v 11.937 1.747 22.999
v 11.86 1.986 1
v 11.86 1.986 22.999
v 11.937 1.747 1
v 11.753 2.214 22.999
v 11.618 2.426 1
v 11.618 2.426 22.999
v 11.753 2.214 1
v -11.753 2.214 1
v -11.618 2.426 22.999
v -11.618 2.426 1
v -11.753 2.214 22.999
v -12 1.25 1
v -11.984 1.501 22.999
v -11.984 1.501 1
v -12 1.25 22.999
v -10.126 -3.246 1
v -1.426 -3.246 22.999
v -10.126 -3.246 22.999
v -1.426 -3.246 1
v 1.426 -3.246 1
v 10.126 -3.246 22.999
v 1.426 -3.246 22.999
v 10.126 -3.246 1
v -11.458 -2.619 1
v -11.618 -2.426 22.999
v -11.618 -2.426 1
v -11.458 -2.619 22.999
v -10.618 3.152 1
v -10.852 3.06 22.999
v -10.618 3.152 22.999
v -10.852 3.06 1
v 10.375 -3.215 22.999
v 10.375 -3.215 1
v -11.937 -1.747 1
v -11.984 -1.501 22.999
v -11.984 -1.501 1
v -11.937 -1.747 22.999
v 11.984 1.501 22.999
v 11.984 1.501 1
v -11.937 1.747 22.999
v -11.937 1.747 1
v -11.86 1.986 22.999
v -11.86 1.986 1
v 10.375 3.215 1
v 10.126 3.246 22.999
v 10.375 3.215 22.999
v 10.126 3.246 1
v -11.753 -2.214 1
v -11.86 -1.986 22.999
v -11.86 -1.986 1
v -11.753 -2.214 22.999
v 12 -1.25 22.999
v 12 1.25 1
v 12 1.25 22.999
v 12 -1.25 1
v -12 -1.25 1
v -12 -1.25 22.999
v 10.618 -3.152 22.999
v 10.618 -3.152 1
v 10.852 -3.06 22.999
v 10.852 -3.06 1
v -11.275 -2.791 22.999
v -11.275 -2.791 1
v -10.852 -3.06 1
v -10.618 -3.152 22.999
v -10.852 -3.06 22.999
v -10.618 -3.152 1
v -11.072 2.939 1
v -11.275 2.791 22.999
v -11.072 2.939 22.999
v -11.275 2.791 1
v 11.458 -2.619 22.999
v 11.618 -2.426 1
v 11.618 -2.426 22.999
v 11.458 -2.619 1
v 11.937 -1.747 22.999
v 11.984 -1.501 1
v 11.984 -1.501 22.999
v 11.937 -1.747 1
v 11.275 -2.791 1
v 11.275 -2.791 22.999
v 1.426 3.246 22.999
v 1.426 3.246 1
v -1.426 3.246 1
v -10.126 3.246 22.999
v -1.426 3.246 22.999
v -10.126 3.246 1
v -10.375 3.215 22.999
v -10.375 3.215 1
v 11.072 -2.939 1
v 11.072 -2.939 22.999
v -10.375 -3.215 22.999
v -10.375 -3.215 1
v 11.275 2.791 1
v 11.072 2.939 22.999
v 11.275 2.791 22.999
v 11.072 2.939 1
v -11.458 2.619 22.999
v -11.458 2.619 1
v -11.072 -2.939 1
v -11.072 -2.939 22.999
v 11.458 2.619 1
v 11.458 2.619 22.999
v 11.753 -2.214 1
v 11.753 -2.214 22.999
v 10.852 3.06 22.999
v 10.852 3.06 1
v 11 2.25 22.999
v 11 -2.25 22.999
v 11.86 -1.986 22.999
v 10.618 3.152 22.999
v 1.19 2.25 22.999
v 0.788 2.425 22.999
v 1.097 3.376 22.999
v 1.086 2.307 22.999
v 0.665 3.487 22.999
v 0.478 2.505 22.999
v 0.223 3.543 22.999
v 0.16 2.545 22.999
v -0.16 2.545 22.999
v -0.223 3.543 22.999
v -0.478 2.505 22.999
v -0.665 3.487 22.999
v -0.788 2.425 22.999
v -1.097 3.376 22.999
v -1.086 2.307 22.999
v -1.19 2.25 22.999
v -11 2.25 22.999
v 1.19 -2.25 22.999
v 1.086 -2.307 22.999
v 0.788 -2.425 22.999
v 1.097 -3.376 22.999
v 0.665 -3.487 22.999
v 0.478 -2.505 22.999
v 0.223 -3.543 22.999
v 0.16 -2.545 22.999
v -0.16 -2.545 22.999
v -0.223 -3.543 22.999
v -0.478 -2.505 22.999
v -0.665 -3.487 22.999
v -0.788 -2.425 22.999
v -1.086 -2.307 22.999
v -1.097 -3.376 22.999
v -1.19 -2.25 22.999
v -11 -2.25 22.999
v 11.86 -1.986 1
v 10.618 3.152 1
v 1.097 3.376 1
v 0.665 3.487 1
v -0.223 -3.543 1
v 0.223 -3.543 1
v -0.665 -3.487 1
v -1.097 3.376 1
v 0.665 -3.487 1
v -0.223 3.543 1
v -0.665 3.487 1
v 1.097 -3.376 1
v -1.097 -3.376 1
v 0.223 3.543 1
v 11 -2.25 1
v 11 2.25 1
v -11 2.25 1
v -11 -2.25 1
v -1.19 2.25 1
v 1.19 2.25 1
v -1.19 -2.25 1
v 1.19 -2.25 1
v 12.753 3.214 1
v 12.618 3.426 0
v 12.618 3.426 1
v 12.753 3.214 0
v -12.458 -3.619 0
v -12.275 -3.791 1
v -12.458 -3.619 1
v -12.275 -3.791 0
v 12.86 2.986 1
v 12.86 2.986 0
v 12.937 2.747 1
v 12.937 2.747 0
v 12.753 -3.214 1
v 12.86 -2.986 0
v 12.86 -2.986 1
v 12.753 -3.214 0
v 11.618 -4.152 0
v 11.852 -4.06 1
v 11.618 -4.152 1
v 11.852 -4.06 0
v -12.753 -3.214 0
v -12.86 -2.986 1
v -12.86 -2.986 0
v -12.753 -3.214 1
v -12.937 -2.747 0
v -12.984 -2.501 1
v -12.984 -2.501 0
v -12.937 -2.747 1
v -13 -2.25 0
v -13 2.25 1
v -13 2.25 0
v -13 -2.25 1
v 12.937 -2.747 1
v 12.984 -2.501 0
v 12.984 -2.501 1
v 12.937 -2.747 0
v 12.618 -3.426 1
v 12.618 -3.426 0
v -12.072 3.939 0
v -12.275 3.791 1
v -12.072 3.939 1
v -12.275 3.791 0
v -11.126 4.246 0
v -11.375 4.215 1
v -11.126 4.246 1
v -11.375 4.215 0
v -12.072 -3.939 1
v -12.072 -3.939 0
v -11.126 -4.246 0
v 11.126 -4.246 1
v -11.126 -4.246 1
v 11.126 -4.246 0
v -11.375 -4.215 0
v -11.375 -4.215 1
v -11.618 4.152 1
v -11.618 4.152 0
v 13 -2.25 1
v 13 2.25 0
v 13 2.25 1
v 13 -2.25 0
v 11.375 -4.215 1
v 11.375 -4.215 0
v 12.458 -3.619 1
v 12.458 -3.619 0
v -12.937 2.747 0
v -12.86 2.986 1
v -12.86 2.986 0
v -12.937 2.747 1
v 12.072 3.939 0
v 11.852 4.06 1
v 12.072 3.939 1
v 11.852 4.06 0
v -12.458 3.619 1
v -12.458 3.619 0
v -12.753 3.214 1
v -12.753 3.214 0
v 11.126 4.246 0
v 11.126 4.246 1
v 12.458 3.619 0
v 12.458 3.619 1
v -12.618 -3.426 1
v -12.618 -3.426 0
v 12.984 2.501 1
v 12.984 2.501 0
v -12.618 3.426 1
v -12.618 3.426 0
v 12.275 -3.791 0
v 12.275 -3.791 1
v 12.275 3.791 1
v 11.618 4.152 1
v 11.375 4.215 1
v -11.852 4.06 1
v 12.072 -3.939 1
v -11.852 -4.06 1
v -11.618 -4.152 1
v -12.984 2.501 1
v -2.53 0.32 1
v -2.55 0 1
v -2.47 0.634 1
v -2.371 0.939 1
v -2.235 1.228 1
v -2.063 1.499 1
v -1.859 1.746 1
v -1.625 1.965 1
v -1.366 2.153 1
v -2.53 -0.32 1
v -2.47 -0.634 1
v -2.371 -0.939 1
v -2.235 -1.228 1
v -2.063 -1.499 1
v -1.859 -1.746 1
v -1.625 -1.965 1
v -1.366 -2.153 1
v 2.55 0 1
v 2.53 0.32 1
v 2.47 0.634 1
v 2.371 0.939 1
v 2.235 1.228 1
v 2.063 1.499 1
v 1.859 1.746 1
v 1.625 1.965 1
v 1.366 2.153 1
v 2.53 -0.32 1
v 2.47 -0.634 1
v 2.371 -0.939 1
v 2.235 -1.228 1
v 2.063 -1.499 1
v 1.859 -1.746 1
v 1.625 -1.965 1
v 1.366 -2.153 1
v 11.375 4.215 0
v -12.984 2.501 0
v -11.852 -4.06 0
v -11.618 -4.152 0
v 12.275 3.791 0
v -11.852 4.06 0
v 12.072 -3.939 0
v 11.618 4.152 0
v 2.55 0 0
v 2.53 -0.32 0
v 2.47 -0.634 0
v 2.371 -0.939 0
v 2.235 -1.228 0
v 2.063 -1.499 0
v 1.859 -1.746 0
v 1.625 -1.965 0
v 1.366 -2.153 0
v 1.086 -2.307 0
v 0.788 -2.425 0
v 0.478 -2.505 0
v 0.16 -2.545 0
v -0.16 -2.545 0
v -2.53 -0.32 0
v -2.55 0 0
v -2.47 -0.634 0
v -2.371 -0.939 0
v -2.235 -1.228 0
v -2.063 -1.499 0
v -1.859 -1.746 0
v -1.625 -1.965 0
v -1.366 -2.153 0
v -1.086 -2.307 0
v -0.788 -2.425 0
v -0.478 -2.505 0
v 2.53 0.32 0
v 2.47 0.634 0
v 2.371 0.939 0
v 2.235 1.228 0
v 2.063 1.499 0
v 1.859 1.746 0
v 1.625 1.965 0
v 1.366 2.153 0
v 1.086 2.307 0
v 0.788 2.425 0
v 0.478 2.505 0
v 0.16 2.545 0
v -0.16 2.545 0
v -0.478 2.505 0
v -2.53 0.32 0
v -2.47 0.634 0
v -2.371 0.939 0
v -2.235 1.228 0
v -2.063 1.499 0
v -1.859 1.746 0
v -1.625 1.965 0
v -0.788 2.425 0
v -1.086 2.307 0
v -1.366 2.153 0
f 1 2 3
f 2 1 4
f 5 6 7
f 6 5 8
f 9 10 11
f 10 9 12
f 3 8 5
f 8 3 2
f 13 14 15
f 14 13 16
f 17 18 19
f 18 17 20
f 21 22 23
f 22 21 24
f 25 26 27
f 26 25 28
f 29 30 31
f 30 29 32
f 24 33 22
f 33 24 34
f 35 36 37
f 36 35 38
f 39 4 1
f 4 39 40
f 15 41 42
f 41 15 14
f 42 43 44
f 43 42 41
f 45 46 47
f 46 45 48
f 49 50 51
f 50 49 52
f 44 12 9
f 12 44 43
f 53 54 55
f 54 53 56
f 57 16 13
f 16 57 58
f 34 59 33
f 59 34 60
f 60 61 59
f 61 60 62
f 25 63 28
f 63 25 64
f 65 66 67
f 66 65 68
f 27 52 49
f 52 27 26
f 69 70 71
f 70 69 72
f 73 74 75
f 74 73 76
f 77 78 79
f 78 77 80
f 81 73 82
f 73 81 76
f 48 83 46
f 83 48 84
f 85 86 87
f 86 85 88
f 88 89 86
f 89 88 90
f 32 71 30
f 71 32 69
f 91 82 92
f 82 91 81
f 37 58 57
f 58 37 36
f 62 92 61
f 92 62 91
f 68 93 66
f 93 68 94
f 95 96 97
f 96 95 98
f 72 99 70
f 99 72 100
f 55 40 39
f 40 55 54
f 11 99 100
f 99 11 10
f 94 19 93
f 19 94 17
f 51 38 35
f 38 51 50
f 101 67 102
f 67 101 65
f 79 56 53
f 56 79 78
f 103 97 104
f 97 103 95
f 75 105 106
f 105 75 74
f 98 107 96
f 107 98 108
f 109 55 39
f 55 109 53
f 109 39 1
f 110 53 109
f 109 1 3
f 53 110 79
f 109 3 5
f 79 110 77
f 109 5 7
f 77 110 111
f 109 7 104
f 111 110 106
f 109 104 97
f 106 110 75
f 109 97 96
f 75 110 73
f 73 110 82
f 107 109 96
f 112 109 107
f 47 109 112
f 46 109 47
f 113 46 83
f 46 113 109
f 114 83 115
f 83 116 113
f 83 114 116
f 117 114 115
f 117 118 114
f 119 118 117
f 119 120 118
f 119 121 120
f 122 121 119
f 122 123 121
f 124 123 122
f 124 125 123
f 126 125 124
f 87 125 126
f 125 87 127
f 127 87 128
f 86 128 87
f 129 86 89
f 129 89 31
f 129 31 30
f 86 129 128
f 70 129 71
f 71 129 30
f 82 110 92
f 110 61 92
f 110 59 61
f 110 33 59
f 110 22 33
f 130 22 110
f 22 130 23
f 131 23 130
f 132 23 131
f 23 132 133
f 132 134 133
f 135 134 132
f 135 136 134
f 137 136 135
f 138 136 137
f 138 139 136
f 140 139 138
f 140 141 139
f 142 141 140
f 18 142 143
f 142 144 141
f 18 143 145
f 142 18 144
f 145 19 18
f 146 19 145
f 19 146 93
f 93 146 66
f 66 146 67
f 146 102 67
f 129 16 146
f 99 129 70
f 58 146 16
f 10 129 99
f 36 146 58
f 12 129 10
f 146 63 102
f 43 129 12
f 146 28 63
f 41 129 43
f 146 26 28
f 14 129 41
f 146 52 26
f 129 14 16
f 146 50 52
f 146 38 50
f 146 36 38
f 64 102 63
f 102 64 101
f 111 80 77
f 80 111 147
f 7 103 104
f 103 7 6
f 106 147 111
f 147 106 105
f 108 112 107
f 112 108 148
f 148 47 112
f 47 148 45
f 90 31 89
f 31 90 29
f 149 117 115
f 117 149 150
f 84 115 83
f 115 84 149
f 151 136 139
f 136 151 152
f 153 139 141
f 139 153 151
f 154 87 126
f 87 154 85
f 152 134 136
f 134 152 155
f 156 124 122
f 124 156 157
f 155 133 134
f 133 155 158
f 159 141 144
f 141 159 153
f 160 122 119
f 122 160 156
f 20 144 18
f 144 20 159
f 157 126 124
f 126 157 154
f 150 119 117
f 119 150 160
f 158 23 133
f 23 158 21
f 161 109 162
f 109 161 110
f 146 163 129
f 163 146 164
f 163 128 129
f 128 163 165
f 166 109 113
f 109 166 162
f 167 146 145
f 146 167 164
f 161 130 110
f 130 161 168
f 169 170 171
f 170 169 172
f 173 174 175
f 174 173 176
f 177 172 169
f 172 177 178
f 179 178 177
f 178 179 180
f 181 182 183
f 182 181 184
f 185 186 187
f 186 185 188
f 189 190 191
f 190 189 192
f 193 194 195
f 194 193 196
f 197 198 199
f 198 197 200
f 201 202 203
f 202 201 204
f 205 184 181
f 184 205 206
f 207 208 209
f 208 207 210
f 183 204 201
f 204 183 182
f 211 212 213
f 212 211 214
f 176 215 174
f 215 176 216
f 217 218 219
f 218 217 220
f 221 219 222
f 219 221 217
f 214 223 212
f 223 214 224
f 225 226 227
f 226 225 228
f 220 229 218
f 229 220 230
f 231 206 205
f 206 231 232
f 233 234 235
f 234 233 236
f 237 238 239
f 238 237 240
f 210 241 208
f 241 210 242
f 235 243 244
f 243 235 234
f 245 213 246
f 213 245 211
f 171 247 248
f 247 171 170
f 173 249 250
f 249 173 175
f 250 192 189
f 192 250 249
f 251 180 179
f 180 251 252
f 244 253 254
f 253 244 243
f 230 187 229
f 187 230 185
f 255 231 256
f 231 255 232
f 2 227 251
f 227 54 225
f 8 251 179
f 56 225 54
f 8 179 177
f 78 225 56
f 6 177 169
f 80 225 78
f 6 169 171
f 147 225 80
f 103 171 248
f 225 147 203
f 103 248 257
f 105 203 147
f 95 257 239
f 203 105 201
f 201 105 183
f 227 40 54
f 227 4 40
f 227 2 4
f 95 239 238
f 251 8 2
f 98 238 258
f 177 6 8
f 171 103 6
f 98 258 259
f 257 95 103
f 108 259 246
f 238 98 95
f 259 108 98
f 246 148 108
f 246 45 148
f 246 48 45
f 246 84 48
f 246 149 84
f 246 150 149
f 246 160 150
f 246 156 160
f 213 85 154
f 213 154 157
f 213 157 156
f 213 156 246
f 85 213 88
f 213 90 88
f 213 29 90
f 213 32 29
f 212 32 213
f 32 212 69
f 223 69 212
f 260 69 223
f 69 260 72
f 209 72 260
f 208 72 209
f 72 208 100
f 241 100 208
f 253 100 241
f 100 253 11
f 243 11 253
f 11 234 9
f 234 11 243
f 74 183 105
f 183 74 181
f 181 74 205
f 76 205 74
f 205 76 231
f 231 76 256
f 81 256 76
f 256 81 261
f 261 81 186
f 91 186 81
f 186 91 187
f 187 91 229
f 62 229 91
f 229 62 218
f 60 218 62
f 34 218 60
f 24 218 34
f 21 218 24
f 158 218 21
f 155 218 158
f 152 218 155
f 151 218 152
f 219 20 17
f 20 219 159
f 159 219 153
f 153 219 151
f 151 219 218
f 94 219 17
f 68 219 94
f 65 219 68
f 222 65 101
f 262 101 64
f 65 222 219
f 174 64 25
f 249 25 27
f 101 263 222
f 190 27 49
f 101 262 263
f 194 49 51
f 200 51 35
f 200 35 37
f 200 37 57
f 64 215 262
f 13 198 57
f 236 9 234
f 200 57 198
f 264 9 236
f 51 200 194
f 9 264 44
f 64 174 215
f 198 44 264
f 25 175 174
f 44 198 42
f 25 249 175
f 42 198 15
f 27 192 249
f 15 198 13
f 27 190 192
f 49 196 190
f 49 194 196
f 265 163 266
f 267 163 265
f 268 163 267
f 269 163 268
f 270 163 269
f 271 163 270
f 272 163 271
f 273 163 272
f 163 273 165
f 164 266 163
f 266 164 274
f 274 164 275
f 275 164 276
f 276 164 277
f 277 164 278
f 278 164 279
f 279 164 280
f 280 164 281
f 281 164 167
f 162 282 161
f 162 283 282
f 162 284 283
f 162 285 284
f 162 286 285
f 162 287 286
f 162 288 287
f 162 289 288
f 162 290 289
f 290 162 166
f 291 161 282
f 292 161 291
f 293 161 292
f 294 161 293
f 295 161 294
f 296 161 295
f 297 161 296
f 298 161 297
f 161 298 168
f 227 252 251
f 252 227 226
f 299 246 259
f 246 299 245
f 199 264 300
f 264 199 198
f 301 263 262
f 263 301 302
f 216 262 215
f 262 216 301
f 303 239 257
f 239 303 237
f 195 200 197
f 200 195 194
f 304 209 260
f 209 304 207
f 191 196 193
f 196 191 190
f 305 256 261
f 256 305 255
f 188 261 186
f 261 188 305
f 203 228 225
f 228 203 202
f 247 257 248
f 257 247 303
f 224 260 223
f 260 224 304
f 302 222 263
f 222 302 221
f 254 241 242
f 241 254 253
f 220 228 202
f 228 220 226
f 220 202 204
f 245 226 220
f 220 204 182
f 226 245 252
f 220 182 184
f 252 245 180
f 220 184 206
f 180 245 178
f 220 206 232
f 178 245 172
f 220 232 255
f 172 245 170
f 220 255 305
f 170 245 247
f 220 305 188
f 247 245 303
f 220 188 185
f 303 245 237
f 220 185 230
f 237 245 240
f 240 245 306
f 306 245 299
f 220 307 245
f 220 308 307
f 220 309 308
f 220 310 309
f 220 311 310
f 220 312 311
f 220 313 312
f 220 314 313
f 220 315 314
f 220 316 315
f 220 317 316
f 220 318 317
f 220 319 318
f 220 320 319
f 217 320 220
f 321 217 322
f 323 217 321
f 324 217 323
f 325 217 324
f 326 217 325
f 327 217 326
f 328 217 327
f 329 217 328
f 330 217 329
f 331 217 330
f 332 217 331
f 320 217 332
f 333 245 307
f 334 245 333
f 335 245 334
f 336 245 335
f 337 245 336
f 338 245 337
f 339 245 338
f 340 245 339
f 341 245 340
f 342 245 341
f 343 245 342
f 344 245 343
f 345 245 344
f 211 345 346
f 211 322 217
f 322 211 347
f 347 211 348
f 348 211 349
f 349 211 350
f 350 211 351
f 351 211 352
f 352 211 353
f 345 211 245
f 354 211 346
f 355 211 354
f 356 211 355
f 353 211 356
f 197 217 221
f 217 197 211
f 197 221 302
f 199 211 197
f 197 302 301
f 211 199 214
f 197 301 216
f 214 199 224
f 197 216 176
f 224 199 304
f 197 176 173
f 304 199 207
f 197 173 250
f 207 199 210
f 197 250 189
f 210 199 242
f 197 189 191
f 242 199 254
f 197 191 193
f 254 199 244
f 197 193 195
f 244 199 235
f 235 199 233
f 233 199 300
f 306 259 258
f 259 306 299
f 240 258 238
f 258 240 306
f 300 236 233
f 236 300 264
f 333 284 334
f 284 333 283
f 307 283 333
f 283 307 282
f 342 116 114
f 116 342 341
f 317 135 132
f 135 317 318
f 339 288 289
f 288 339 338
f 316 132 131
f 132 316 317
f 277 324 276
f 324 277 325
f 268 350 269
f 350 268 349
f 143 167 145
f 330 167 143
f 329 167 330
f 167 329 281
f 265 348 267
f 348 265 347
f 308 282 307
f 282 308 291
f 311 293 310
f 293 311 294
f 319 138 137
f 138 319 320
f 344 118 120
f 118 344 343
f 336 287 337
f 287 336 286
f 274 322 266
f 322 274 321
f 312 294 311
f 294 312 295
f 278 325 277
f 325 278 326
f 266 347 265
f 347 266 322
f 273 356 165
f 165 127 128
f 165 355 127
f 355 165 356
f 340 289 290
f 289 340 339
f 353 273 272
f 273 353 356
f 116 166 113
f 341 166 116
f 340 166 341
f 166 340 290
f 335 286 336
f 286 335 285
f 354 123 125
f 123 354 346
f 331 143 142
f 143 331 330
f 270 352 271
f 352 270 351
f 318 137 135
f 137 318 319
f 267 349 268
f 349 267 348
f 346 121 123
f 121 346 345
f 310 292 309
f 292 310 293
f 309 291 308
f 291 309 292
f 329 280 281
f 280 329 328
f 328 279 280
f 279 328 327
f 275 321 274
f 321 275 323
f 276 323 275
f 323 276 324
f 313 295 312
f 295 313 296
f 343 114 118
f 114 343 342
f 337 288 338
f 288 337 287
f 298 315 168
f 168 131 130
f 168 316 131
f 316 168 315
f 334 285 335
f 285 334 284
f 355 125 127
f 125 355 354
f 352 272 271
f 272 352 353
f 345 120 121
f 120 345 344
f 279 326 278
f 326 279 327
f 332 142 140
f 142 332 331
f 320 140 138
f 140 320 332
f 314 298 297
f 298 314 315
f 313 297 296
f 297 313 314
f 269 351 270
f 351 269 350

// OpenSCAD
// This work is licensed under a Creative Commons Attribution-ShareAlike 4.0 International License (http://creativecommons.org/licenses/by-sa/4.0/)

bit_height = 21;
bit_width = 22;
bit_thickness = 4.5;
post_diameter = 5.1;
wall_thickness = 1;
bottom_border = 1;

module __customizer_limit__() {}

$fn = 50;

difference() {
    union() {
        translate([0, 0, wall_thickness/2])
            round_cube([bit_width + 2*wall_thickness + 2*bottom_border, bit_thickness +
            2*wall_thickness + 2*bottom_border, wall_thickness], radius=2, center=true);
        translate([0, 0, wall_thickness + (bit_height + wall_thickness) / 2 - 0.001])
            difference() {
                union() {
                    round_cube([bit_width + 2*wall_thickness, bit_thickness + 2*wall_thickness,
                        bit_height + wall_thickness], radius=2, center=true);
                    cylinder(d=post_diameter + 2 * wall_thickness, h=bit_height + wall_thickness, center=true);
                }
                cube([bit_width, bit_thickness, bit_height + wall_thickness + 0.001], center=true);
            }
    }
    cylinder(h=3*bit_height, d=post_diameter, center= true);
}

module center(dims) { translate([-dims[0]/2, -dims[1]/2, -dims[2]/2]) children(); }

module _center_by_flag(dimensions, center) {
    if (center) {
        center(dimensions) children();
    } else {
        children();
    }
}

module round_cube(dimensions, radius, center=false) {
    width = dimensions[0];
    depth = dimensions[1];
    height = dimensions[2];
    assert(radius < width/2, "radius should be less than half of x size");
    assert(radius < depth/2, "radius should be less than half of y size")
    _center_by_flag(dimensions, center)
        translate([radius, radius, 0]) 
            linear_extrude(height=height) 
                minkowski() {
                    square([width - radius*2, depth - radius*2]);
                    circle(r=radius);
                }
}
